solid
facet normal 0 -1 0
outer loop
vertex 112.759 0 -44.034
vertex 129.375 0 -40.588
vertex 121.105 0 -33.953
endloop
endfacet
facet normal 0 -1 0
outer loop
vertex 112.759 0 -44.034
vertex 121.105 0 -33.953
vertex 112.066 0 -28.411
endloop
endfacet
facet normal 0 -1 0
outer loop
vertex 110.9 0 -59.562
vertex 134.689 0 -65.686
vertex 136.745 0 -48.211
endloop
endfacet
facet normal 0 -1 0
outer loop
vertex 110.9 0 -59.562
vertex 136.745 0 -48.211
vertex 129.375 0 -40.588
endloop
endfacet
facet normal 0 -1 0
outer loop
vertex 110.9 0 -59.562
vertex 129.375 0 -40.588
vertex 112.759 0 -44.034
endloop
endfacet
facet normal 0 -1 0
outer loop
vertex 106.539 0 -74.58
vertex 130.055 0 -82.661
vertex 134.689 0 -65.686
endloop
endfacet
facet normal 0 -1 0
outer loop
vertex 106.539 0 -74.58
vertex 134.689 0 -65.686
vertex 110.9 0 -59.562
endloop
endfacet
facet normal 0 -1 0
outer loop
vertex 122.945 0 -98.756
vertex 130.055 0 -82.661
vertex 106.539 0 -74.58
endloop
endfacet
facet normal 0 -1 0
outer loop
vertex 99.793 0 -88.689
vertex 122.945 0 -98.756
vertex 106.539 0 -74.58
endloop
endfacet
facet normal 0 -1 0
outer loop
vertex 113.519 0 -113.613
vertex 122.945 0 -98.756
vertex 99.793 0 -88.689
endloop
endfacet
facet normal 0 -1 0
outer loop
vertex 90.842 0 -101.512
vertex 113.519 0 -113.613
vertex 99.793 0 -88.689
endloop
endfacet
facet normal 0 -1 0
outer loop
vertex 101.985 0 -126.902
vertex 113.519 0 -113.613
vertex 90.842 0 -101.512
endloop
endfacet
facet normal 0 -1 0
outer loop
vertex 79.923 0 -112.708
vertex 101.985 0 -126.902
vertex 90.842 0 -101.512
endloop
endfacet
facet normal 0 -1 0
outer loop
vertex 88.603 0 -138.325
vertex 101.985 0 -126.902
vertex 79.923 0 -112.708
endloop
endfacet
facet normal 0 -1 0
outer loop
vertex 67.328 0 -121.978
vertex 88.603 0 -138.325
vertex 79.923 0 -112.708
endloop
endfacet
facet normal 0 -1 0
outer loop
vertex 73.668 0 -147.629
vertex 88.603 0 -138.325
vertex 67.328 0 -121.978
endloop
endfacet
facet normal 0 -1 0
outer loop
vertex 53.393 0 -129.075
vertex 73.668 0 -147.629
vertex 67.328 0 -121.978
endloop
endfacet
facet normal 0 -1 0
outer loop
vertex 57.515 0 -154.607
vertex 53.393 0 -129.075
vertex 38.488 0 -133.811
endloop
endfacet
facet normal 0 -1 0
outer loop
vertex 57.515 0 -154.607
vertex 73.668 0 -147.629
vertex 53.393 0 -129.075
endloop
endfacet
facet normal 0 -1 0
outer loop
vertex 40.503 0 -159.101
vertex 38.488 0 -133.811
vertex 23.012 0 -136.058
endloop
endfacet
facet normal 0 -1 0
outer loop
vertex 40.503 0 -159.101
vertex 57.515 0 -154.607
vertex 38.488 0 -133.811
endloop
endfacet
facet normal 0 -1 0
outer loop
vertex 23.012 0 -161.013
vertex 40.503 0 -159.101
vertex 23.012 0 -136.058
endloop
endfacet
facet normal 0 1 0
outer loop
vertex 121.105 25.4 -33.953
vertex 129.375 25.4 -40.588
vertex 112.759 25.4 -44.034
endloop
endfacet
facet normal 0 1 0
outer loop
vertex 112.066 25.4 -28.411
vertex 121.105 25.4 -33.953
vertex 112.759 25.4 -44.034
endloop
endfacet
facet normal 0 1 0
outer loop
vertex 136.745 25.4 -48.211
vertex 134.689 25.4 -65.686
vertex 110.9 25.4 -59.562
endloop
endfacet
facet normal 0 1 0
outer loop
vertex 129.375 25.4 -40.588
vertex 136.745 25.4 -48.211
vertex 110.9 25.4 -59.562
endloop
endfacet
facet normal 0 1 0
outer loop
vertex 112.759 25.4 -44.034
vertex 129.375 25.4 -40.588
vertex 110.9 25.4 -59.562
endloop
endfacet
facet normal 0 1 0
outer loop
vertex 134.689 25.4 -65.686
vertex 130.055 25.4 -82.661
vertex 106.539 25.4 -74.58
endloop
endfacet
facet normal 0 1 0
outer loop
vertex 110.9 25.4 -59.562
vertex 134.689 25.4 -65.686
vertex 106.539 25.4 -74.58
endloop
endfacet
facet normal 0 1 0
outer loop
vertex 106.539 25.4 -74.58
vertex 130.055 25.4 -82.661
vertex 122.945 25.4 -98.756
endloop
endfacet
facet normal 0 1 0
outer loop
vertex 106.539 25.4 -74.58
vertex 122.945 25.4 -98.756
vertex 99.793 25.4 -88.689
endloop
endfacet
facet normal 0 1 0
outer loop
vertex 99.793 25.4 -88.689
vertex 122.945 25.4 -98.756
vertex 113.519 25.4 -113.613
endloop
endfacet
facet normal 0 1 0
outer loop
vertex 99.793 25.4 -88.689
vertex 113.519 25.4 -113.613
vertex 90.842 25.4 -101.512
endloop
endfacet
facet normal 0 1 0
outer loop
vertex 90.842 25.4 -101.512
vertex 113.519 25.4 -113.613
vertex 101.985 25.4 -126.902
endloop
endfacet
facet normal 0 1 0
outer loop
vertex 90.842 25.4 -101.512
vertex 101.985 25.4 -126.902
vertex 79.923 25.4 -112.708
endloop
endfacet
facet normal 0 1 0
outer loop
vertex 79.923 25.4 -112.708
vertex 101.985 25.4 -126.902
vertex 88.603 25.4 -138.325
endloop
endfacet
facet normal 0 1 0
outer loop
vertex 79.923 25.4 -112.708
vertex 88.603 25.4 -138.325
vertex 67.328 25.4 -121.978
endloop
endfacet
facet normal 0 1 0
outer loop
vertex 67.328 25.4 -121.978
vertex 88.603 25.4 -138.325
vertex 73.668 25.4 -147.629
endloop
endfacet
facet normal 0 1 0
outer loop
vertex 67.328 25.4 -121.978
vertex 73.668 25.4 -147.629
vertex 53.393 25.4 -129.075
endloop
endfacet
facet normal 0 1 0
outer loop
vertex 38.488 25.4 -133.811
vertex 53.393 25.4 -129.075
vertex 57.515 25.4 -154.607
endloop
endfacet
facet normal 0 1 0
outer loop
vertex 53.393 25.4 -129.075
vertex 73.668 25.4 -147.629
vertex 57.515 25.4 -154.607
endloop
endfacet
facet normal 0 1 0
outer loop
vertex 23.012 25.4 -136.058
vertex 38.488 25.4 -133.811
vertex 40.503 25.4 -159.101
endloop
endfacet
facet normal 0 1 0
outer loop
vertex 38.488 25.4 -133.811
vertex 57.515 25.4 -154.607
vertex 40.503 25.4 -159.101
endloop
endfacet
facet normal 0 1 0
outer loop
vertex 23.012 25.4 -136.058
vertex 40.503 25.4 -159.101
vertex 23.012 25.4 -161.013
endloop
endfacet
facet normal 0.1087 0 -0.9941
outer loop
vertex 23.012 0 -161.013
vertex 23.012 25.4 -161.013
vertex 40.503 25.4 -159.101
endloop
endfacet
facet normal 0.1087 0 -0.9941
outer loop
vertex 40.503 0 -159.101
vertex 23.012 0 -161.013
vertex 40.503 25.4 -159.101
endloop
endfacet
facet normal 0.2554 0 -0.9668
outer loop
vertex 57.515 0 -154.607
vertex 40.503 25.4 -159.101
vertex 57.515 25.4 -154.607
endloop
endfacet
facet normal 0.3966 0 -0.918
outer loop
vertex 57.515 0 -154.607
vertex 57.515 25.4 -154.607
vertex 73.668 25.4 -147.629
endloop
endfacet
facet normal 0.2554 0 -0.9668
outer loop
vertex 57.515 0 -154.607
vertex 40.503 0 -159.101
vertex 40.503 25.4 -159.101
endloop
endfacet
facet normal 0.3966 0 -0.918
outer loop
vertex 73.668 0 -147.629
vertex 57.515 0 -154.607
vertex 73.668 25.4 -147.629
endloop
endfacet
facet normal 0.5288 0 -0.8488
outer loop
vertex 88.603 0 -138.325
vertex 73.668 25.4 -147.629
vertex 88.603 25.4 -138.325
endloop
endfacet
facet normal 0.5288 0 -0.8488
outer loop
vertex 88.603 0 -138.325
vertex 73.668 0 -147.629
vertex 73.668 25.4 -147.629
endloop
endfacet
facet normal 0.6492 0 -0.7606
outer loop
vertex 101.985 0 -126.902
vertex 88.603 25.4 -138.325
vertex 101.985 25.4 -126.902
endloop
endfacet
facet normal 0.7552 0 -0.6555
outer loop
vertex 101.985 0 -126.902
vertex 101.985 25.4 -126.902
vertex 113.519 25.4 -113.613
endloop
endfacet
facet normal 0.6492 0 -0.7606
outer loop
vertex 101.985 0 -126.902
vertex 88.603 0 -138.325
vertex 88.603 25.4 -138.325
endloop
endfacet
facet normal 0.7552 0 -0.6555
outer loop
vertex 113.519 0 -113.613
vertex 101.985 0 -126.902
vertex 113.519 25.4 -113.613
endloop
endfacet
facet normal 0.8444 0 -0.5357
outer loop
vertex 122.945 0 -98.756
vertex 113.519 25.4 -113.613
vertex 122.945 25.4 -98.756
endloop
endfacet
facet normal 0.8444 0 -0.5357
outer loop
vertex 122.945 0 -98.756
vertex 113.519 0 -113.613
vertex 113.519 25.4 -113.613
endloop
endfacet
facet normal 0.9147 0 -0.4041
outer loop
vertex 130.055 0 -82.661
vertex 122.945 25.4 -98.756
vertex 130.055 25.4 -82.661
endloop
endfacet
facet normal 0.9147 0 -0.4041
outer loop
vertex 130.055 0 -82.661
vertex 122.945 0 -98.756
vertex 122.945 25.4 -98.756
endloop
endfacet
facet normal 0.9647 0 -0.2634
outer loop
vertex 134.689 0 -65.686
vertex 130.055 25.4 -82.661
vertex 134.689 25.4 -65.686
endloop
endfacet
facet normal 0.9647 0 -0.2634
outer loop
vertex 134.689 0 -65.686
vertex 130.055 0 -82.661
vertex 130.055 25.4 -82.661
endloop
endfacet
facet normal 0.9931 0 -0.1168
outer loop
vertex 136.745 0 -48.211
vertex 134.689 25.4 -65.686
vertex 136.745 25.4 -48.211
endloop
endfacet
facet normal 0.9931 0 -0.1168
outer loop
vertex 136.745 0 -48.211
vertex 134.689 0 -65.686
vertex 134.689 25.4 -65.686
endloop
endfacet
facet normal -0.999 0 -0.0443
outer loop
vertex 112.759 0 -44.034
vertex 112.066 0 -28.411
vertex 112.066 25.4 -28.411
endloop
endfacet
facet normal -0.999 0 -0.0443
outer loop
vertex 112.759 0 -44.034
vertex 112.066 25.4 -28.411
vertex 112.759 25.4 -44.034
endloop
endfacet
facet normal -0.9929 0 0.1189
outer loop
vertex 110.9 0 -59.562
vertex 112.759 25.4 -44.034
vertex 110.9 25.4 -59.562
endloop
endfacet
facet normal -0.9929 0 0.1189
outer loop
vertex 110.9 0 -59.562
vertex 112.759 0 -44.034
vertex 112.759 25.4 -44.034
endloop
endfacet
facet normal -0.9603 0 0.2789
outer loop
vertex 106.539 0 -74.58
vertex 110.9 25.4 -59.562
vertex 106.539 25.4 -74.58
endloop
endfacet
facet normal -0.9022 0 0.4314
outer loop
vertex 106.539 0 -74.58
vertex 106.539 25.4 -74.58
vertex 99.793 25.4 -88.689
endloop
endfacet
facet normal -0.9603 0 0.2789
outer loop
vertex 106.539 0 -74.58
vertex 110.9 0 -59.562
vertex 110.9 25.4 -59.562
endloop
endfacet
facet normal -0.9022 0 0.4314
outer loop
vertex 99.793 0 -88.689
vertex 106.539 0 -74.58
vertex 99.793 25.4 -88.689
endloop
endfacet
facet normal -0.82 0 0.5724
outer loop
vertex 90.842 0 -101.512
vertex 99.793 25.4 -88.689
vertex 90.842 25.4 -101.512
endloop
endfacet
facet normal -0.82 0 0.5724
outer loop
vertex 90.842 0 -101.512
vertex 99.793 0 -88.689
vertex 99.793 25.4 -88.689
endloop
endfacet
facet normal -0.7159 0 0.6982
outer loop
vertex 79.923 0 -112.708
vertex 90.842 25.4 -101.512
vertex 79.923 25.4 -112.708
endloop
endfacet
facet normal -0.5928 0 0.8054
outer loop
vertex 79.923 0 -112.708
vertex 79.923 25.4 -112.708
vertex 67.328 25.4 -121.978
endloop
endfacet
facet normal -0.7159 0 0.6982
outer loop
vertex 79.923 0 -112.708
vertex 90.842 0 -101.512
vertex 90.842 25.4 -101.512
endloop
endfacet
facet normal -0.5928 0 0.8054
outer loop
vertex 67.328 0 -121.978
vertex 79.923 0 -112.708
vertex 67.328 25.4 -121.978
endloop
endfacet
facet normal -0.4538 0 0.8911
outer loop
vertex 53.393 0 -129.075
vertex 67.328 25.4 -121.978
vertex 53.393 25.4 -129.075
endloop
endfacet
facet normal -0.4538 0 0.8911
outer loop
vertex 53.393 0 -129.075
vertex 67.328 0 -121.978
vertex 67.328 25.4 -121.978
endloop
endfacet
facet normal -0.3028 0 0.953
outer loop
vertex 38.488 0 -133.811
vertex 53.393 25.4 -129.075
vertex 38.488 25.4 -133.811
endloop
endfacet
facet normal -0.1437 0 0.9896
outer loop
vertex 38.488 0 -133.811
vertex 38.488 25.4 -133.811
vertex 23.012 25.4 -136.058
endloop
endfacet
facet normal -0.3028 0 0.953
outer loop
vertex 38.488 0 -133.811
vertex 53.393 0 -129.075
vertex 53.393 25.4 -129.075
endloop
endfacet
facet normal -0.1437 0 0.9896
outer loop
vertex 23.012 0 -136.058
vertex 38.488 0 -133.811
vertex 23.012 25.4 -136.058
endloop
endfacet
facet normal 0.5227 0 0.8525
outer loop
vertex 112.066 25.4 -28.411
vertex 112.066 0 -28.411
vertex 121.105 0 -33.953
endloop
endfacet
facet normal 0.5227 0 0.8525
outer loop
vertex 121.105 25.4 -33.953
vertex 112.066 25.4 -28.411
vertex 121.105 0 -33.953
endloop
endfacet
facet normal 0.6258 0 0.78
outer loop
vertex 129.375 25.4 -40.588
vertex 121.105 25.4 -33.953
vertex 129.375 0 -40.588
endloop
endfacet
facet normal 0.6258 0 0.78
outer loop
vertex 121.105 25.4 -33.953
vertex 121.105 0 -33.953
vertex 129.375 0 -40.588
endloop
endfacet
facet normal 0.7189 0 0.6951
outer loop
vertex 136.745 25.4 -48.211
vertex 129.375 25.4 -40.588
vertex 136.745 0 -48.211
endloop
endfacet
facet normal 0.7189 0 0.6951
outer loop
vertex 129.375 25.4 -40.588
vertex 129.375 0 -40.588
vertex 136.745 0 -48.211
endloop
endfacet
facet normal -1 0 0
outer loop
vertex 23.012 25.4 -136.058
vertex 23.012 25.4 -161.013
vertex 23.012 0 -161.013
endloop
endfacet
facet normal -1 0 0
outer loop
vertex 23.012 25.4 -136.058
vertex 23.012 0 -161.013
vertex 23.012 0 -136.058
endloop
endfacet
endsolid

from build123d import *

# Parameters (mm, degrees)
BOSS_EXTRUDE1_DEPTH     = 25.4
BOSS_EXTRUDE1_2_DEPTH   = 25.4
CUT_EXTRUDE1_DEPTH      = 281.867791968
CUT_EXTRUDE1_DEPTH_BACK = 281.867791968
SKETCH2_W               = 46.910236734
SKETCH2_H               = 46.937556504
CUT_EXTRUDE2_DEPTH      = 281.278275978
CUT_EXTRUDE2_DEPTH_BACK = 281.278275978
SKETCH3_OUTSIDE_W       = 231.024
SKETCH3_OUTSIDE_H       = 277.081


with BuildPart() as part:
    # Sketch1 → Boss-Extrude1 (new body)
    with BuildSketch(Plane(origin=(0, 0, 0), x_dir=(1, 0, 0), z_dir=(0, 1, 0))):
        with BuildLine():
            Line((0, 80.02759766), (0, 219.067642019))
            Line((0, 219.067642019), (103.040086398, 219.067642019))
            Line((103.040086398, 219.067642019), (103.040086398, 195.999460881))
            Line((103.040086398, 195.999460881), (23.011829096, 195.999460881))
            Line((23.011829096, 195.999460881), (23.011829096, 161.013213822))
            ThreePointArc((23.011829096, 161.013213822), (101.985495584, 126.901824422), (136.744902109, 48.211224327))
            ThreePointArc((136.744902109, 48.211224327), (146.280346481, 62.911008862), (150.026111113, 80.02759766))
            Line((150.026111113, 80.02759766), (150.026111113, 148.011746996))
            Line((150.026111113, 148.011746996), (172.974333949, 148.011746996))
            Line((172.974333949, 148.011746996), (172.974333949, 80.02759766))
            ThreePointArc((172.974333949, 80.02759766), (86.487166974, 0.037389651), (0, 80.02759766))
        make_face()
        with BuildLine():
            Line((23.011829096, 136.058182002), (23.011829096, 80.02759766))
            ThreePointArc((23.011829096, 80.02759766), (54.48283159, 31.69310754), (112.066438029, 28.410547154))
            ThreePointArc((112.066438029, 28.410547154), (90.841729512, 101.512108787), (23.011829096, 136.058182002))
        make_face(mode=Mode.SUBTRACT)
    extrude(amount=BOSS_EXTRUDE1_DEPTH)

    # Sketch3 outside → Cut-Extrude2 (cut, two sides: drawn at the far end of the back side and taken through both)
    with BuildSketch(Plane(origin=(0, 25.4, 0), x_dir=(1, 0, 0), z_dir=(0, 1, 0)).offset(-CUT_EXTRUDE2_DEPTH_BACK)):
        with Locations((86.487, 109.5525)):
            Rectangle(SKETCH3_OUTSIDE_W, SKETCH3_OUTSIDE_H)
        with BuildLine():
            Line((23.011829096, 161.013213822), (23.011829096, 136.058182002))
            ThreePointArc((23.011829096, 136.058182002), (90.841729512, 101.512108787), (112.066438029, 28.410547154))
            ThreePointArc((112.066438029, 28.410547154), (125.345033884, 37.140114864), (136.744902109, 48.211224327))
            ThreePointArc((136.744902109, 48.211224327), (101.985495584, 126.901824422), (23.011829096, 161.013213822))
        make_face(mode=Mode.SUBTRACT)
    extrude(amount=CUT_EXTRUDE2_DEPTH + CUT_EXTRUDE2_DEPTH_BACK, mode=Mode.SUBTRACT)


with BuildPart() as body_2:
    # Sketch1 → Boss-Extrude1 2 (new body)
    with BuildSketch(Plane(origin=(0, 0, 0), x_dir=(1, 0, 0), z_dir=(0, 1, 0))):
        Polygon((173.927929859, 172.130085515), (150.026111113, 172.130085515), (150.026111113, 195.999460881), (127.017693125, 195.999460881), (127.017693125, 219.067642019), (173.927929859, 219.067642019), align=None)
    extrude(amount=BOSS_EXTRUDE1_2_DEPTH)

    # Sketch2 → Cut-Extrude1 (cut, two sides: drawn at the far end of the back side and taken through both)
    with BuildSketch(Plane(origin=(0, 25.4, 0), x_dir=(1, 0, 0), z_dir=(0, 1, 0)).offset(-CUT_EXTRUDE1_DEPTH_BACK)):
        with Locations((150.472811492, 195.598863767)):
            Rectangle(SKETCH2_W, SKETCH2_H)
    extrude(amount=CUT_EXTRUDE1_DEPTH + CUT_EXTRUDE1_DEPTH_BACK, mode=Mode.SUBTRACT)


solid = part.part
